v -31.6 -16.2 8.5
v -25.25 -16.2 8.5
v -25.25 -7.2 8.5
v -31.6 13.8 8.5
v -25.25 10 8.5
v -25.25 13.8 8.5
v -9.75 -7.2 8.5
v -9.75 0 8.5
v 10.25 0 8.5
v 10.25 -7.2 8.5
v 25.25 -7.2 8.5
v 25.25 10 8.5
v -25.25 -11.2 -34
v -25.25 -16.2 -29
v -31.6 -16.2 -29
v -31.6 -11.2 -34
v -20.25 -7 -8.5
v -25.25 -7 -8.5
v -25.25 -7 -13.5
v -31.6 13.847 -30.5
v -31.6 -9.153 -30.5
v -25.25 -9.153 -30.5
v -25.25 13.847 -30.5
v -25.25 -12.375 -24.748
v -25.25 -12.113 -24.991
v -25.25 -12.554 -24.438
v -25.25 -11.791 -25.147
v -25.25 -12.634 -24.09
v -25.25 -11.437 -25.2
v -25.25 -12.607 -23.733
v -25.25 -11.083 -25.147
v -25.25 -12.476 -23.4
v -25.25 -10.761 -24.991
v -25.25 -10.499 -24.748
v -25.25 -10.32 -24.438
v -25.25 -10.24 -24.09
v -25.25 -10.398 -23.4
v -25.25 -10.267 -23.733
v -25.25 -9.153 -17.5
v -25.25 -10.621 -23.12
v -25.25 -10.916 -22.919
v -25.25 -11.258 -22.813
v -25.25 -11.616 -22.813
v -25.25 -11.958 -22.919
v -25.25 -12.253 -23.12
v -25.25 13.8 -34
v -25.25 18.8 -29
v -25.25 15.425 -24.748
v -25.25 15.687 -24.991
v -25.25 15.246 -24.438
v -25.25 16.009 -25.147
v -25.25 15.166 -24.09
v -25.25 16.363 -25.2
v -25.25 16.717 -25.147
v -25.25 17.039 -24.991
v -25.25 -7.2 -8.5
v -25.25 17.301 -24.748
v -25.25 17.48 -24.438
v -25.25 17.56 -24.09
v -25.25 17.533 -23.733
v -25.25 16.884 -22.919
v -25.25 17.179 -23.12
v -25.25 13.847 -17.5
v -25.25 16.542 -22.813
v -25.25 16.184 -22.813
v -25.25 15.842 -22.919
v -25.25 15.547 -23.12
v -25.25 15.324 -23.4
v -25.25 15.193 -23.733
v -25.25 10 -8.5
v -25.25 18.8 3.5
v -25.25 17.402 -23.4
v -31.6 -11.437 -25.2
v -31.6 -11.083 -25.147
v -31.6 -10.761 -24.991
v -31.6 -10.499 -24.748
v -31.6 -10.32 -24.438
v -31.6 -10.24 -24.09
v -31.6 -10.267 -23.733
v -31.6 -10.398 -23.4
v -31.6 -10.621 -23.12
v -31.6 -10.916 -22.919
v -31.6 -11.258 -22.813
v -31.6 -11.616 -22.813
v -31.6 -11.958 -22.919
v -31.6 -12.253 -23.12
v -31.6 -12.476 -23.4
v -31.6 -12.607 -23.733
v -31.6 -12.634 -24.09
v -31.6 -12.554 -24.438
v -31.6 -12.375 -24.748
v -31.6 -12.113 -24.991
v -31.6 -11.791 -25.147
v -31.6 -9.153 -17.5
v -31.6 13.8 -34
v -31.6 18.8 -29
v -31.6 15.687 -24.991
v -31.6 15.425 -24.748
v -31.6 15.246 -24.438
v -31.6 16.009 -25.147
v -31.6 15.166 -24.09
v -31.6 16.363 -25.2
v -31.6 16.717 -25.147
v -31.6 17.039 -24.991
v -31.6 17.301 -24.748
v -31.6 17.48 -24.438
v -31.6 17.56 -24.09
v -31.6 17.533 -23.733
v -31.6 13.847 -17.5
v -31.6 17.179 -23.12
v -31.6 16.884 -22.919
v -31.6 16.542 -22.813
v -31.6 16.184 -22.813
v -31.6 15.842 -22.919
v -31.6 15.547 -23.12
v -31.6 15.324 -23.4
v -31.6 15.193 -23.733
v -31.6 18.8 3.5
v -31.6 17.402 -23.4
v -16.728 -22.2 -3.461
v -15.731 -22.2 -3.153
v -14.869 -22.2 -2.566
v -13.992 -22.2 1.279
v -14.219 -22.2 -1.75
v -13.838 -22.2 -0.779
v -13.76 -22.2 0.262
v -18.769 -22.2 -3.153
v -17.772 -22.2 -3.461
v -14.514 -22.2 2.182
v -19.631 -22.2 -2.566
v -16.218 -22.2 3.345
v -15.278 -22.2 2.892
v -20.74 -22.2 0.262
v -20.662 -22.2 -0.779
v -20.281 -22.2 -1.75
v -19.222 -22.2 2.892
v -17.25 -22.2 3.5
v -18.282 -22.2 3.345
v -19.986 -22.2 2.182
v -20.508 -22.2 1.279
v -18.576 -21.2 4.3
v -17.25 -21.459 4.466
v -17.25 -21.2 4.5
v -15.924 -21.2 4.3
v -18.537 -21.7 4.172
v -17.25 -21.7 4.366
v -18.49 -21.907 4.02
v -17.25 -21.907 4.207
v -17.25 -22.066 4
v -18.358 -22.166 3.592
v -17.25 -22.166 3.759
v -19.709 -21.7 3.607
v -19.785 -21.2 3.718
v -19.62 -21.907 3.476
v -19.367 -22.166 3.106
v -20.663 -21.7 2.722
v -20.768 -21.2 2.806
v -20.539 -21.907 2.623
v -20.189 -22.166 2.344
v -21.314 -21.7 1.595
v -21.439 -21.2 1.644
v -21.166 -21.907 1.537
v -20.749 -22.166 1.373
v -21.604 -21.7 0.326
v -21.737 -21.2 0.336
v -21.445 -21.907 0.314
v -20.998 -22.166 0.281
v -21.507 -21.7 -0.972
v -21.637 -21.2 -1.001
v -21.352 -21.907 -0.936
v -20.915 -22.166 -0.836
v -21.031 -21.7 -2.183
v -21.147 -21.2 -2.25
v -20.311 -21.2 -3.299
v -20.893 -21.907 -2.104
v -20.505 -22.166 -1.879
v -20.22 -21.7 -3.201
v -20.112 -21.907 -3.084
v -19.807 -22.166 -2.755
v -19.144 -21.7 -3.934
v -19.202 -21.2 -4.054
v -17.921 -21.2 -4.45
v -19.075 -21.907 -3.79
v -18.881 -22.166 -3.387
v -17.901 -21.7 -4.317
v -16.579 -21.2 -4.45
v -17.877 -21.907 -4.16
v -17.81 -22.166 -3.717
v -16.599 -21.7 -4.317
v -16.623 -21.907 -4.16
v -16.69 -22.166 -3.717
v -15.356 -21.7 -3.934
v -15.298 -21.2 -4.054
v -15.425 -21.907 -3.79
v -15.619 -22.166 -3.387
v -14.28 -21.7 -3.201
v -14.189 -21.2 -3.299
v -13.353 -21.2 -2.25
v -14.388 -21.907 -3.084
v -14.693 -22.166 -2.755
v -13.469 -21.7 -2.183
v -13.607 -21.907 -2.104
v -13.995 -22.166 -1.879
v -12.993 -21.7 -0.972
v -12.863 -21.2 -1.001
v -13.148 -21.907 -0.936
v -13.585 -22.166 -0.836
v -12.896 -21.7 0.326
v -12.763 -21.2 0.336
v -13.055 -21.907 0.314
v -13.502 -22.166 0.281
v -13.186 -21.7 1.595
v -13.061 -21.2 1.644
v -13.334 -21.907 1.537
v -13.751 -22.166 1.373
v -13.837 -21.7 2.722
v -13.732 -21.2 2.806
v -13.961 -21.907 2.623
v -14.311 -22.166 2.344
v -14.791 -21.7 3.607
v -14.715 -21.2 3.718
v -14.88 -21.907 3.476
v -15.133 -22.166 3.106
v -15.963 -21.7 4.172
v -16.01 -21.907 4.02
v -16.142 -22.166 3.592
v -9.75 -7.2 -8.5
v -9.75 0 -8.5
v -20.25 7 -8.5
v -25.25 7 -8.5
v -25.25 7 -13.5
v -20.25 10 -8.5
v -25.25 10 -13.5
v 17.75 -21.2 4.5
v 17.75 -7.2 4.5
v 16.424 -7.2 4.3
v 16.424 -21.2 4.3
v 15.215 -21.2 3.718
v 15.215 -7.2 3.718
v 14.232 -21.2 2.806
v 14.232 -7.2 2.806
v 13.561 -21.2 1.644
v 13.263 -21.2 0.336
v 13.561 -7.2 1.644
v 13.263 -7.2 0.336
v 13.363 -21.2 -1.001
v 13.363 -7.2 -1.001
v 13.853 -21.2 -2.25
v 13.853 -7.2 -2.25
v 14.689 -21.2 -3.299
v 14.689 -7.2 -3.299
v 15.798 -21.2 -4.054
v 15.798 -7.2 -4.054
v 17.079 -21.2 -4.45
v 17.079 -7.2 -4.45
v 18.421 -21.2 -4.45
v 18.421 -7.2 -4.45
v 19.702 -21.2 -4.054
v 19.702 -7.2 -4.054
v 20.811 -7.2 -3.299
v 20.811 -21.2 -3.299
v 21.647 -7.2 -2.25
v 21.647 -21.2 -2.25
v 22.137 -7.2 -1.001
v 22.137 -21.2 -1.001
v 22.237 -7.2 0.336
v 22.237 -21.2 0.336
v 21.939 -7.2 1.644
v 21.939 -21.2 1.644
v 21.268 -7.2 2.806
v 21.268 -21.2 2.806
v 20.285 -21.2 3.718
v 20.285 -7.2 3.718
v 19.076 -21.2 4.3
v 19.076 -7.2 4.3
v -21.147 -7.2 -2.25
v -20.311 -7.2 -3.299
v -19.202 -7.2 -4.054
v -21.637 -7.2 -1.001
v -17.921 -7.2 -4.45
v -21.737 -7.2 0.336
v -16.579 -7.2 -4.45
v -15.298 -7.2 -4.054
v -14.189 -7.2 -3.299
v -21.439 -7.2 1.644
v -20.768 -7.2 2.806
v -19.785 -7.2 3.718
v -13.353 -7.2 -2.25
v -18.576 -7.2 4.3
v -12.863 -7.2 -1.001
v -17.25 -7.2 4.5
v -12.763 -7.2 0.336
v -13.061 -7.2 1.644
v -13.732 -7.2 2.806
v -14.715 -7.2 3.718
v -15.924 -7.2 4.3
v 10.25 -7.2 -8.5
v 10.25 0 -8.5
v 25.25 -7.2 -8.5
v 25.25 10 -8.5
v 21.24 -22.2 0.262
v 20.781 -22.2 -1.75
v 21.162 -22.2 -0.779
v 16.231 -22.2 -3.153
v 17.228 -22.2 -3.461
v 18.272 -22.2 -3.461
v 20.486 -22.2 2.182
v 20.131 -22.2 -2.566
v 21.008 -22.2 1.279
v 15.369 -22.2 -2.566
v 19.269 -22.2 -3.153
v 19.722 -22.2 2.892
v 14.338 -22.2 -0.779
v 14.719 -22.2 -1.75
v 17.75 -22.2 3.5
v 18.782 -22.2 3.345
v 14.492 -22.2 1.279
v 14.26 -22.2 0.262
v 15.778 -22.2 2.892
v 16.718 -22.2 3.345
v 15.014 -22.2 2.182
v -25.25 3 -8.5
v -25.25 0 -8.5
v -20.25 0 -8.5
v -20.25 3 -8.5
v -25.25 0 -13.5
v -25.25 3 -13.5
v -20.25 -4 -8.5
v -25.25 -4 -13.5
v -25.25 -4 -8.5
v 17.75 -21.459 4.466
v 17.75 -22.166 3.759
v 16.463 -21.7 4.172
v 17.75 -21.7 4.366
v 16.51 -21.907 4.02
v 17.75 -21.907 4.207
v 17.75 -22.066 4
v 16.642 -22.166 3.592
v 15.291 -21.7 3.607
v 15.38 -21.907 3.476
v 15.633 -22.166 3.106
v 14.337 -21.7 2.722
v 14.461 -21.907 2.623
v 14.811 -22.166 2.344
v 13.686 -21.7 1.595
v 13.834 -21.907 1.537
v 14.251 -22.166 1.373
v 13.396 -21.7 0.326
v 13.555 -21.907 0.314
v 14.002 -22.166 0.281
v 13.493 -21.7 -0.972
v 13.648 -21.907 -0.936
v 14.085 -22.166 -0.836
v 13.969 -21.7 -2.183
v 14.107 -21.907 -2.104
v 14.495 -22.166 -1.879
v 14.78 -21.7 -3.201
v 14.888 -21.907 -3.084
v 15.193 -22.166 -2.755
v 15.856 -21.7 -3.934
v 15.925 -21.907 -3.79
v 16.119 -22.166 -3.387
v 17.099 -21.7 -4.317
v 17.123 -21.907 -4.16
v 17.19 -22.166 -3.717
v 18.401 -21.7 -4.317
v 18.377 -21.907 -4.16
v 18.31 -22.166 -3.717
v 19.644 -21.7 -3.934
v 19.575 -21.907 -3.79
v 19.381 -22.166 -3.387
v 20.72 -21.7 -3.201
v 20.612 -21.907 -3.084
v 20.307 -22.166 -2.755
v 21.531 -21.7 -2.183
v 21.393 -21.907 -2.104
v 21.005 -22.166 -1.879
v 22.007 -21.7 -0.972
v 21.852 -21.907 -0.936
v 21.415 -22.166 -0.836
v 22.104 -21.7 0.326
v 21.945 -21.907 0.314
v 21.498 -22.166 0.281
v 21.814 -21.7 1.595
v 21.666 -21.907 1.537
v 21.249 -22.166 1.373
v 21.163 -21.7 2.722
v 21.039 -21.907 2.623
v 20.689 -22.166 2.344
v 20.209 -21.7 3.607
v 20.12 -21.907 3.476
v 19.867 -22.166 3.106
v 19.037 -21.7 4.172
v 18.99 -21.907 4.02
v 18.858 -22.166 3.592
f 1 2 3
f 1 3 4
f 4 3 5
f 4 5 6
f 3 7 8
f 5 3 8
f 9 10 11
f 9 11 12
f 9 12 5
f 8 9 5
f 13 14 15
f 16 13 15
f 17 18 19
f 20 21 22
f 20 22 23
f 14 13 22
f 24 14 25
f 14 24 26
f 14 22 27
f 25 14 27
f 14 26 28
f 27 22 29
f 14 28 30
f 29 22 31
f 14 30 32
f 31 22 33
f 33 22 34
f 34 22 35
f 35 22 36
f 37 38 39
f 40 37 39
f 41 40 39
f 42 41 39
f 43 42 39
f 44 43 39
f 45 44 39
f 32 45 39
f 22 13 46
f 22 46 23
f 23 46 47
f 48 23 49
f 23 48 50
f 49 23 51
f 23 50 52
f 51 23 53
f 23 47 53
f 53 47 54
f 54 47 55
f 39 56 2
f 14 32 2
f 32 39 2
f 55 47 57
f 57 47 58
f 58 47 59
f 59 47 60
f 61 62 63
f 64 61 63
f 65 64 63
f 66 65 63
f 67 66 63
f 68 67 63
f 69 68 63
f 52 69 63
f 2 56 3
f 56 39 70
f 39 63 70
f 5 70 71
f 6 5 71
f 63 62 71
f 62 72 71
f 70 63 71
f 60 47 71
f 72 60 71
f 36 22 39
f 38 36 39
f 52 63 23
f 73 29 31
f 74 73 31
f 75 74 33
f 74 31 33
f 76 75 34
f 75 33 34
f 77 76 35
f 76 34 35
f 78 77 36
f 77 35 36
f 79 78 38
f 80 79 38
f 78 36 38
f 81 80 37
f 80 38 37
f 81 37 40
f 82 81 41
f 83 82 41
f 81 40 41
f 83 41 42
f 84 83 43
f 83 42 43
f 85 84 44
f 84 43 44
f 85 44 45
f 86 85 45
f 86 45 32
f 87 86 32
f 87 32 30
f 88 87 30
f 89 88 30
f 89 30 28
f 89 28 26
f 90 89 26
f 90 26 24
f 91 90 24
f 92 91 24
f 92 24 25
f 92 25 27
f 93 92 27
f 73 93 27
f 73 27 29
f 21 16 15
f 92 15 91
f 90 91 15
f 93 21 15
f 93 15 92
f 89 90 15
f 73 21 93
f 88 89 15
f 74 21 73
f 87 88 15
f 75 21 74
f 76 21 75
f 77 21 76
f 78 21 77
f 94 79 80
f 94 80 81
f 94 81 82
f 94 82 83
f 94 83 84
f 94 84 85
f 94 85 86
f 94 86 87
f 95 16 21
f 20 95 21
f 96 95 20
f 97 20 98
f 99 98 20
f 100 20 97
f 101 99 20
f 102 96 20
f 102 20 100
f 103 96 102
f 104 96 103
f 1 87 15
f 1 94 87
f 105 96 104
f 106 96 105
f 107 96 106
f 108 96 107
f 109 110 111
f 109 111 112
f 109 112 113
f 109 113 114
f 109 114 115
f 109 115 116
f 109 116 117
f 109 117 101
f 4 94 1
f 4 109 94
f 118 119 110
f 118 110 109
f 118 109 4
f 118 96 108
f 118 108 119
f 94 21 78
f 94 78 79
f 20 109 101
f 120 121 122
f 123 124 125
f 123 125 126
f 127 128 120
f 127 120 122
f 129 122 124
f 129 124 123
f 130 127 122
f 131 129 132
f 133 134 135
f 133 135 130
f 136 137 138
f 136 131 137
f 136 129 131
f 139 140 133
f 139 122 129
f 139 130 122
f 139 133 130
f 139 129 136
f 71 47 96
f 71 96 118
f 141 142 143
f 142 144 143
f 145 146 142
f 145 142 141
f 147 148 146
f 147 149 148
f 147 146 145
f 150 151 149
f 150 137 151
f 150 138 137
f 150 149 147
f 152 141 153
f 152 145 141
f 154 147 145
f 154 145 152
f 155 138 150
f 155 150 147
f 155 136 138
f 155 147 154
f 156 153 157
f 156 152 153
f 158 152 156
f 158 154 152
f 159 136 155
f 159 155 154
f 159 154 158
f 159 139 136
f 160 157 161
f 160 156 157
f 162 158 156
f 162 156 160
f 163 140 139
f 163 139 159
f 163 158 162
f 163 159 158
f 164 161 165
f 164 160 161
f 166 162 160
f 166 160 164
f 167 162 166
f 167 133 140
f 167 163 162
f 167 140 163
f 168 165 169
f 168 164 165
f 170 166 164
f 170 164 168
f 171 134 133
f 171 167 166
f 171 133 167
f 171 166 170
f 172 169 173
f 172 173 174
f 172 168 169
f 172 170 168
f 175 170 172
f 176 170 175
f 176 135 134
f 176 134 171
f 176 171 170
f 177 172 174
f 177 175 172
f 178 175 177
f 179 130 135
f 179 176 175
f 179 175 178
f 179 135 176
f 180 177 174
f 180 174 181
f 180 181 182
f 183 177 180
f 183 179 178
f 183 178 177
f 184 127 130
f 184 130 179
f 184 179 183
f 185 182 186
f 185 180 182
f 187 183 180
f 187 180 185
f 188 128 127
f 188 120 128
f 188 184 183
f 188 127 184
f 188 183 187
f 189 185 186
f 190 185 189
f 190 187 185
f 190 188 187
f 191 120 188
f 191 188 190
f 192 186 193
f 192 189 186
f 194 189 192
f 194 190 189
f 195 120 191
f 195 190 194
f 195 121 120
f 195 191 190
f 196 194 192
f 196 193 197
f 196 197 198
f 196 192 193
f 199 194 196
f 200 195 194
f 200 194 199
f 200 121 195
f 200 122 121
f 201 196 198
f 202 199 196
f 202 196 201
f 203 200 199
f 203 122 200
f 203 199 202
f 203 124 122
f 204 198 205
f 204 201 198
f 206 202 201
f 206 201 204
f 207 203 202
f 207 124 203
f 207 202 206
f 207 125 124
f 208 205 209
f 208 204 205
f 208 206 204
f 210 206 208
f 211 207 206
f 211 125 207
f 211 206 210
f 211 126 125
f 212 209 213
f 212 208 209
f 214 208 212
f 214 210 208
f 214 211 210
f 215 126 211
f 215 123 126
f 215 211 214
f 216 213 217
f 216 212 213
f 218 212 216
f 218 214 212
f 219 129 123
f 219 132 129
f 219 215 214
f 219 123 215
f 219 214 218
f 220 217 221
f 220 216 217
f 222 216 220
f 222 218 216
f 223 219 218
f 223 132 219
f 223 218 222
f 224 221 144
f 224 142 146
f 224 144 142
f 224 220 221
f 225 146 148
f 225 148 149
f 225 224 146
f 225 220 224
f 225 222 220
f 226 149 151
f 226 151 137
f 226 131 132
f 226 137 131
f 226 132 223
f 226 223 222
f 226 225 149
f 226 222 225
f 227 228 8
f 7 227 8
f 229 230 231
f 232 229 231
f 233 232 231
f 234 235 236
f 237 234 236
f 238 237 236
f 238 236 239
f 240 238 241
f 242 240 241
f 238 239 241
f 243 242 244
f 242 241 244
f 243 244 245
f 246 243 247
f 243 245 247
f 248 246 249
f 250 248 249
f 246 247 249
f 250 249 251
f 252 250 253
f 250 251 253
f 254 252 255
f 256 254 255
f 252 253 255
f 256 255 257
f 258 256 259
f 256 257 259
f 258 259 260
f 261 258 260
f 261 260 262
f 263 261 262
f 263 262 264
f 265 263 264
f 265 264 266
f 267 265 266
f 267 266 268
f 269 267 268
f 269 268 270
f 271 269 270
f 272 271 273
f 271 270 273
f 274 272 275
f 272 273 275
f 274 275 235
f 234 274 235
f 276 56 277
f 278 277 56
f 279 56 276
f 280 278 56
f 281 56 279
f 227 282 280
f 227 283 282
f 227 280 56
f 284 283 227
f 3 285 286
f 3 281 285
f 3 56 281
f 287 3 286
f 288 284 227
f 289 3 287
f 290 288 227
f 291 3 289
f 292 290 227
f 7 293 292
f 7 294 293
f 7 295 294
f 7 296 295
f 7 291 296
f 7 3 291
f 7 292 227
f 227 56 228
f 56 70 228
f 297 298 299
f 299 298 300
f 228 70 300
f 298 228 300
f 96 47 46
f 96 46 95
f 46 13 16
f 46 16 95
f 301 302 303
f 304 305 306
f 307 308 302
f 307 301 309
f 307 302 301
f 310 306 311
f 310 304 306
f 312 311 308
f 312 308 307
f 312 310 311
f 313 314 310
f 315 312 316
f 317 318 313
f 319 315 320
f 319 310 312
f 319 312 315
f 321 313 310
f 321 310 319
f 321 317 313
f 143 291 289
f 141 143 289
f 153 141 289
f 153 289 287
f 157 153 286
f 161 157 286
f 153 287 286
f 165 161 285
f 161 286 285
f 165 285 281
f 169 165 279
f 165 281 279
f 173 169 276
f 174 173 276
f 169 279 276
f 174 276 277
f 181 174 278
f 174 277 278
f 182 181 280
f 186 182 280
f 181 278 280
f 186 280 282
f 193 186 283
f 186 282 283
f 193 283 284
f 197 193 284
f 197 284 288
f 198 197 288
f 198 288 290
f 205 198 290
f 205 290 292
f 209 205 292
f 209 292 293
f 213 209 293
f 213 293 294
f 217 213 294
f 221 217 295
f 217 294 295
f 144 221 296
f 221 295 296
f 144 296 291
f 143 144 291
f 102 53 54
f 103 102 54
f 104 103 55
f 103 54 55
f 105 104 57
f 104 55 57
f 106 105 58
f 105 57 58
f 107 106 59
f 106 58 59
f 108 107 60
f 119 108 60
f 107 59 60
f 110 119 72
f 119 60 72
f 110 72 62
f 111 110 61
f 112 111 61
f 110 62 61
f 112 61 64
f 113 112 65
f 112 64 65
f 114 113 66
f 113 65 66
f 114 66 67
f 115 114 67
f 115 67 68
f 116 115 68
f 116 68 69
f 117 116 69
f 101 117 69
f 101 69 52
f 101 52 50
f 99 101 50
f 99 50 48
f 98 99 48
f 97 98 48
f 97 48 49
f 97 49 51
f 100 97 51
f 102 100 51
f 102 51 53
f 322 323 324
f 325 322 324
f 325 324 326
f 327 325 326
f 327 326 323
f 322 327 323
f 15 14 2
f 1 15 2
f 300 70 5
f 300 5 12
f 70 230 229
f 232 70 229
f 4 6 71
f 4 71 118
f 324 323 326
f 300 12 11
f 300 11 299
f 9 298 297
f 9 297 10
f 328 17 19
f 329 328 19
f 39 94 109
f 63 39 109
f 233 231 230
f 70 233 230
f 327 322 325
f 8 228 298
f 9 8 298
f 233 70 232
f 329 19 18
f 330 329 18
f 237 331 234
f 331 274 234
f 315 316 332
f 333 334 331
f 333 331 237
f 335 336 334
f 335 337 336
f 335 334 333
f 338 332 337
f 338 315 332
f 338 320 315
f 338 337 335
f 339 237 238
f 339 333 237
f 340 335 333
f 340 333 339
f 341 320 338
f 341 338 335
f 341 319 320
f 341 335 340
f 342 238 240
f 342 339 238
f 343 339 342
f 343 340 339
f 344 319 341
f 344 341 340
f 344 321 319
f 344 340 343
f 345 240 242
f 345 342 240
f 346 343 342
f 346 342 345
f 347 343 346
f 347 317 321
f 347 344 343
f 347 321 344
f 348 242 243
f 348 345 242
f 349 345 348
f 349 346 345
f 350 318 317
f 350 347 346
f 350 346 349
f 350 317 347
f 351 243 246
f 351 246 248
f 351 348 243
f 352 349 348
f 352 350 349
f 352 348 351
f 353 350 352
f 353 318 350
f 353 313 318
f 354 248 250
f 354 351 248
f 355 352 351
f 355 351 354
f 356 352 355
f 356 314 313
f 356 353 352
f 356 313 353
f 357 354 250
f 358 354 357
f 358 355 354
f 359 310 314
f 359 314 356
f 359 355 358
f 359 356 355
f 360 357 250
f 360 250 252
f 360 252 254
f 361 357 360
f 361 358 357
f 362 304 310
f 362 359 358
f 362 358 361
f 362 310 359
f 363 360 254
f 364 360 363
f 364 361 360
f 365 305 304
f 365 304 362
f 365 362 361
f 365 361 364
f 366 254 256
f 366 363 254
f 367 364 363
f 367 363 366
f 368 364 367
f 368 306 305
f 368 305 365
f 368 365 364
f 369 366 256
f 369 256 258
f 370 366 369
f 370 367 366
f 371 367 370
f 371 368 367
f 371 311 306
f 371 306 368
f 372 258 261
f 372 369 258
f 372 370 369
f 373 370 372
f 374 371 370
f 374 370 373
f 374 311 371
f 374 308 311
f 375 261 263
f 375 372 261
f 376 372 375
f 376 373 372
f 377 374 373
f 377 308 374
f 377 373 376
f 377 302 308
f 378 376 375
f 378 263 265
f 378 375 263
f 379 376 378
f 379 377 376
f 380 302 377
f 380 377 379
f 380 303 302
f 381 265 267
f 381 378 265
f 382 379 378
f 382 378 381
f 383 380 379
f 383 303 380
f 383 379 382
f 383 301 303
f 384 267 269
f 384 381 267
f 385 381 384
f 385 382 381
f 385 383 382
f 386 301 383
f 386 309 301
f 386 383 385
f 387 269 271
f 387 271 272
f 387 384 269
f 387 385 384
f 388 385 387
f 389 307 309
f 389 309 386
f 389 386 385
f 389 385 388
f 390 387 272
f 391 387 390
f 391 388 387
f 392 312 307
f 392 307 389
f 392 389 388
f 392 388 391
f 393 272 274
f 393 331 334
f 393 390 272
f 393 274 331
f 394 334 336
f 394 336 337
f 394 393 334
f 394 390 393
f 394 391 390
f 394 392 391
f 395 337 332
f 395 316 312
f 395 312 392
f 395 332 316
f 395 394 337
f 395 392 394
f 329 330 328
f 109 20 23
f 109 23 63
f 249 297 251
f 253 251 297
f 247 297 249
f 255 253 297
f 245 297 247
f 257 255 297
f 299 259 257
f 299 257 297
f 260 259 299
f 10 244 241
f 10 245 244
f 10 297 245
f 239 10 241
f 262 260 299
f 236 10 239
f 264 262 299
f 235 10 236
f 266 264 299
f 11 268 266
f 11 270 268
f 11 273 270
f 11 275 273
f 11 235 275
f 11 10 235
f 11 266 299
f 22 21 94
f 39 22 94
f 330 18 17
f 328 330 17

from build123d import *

# Parameters (mm, degrees)
SKETCH1_W            = 50.5
SKETCH1_H            = 17
BOSS_EXTRUDE1_DEPTH  = 10
SKETCH2_W            = 15.5
SKETCH2_H            = 17
SKETCH2_W_2          = 15
BOSS_EXTRUDE2_DEPTH  = 7.2
SKETCH5_W            = 42.5
SKETCH5_H            = 35
BOSS_EXTRUDE3_DEPTH  = 6.35
SKETCH6_W            = 13
SKETCH6_H            = 23
CUT_EXTRUDE1_DEPTH   = 6.35
M2_CLEARANCE_HOLE1_D = 2.4
CHAMFER1_SIZE        = 5
GUSSET1_START        = 7
GUSSET1_DEPTH        = 3
LPATTERN2_COUNT      = 3
LPATTERN2_PITCH      = 7
SKETCH10_R           = 4.5
BOSS_EXTRUDE4_DEPTH  = 15
FILLET1_R            = 1


# Read off the part's stored shape, not the designer's step: Gusset1
with BuildPart() as part:
    # Sketch1 → Boss-Extrude1 (new body)
    with BuildSketch(Plane(origin=(0, 0, 0), x_dir=(1, 0, 0), z_dir=(0, 1, 0))):
        Rectangle(SKETCH1_W, SKETCH1_H)
    extrude(amount=BOSS_EXTRUDE1_DEPTH)

    # Sketch2 → Boss-Extrude2 (add)
    with BuildSketch(Plane.XZ):
        with Locations((-17.5, 0)):
            Rectangle(SKETCH2_W, SKETCH2_H)
        with Locations((17.75, 0)):
            Rectangle(SKETCH2_W_2, SKETCH2_H)
    extrude(amount=BOSS_EXTRUDE2_DEPTH)

    # Sketch5 → Boss-Extrude3 (add)
    with BuildSketch(Plane.ZY.offset(25.25)):
        with Locations((-12.75, 1.3)):
            Rectangle(SKETCH5_W, SKETCH5_H)
    extrude(amount=BOSS_EXTRUDE3_DEPTH)

    # Sketch6 → Cut-Extrude1 (cut)
    with BuildSketch(Plane.ZY.offset(31.6)):
        with Locations((-24, 2.347)):
            Rectangle(SKETCH6_W, SKETCH6_H)
    extrude(amount=-CUT_EXTRUDE1_DEPTH, mode=Mode.SUBTRACT)

    # M2 Clearance Hole1 (through all)
    with Locations(Plane.ZY.offset(31.6)):
        with Locations((-24, 16.363), (-24, -11.437)):
            Hole(M2_CLEARANCE_HOLE1_D / 2)

    # Chamfer1
    chamfer1_edges = [part.edges().sort_by_distance(p)[0] for p in [
        (-28.425, 18.8, 8.5),
        (-28.425, 18.8, -34),
        (-28.425, -16.2, -34),
    ]]
    chamfer(chamfer1_edges, length=CHAMFER1_SIZE)

    # Sketch10 → Boss-Extrude4 (add)
    with BuildSketch(Plane.XZ.offset(7.2)):
        with Locations(Location((17.75, 0, 0), (0, 0, 90))):
            Circle(SKETCH10_R)
        with Locations(Location((-17.25, 0, 0), (0, 0, 90))):
            Circle(SKETCH10_R)
    extrude(amount=BOSS_EXTRUDE4_DEPTH)

    # Fillet1
    fillet1_edges = [part.edges().sort_by_distance(p)[0] for p in [
        (17.75, -22.2, -4.5),
        (-17.25, -22.2, -4.5),
    ]]
    fillet(fillet1_edges, radius=FILLET1_R)


with BuildPart() as body_2:
    # Gusset1 outline → Gusset1 (new body)
    with BuildSketch(Plane(origin=(0, 0, 0), x_dir=(1, 0, 0), z_dir=(0, 1, 0)).offset(GUSSET1_START)):
        Polygon((-20.25, 8.5), (-25.25, 13.5), (-25.25, 8.5), align=None)
    extrude(amount=GUSSET1_DEPTH)


with BuildPart() as lpattern2_1:
    # LPattern2: pattern copy
    add(body_2.part.moved(Location(Vector(0, -1, 0) * (1 * LPATTERN2_PITCH))))


with BuildPart() as lpattern2_2:
    # LPattern2: pattern copy
    add(body_2.part.moved(Location(Vector(0, -1, 0) * (2 * LPATTERN2_PITCH))))


solid = Compound([part.part, body_2.part, lpattern2_1.part, lpattern2_2.part])
